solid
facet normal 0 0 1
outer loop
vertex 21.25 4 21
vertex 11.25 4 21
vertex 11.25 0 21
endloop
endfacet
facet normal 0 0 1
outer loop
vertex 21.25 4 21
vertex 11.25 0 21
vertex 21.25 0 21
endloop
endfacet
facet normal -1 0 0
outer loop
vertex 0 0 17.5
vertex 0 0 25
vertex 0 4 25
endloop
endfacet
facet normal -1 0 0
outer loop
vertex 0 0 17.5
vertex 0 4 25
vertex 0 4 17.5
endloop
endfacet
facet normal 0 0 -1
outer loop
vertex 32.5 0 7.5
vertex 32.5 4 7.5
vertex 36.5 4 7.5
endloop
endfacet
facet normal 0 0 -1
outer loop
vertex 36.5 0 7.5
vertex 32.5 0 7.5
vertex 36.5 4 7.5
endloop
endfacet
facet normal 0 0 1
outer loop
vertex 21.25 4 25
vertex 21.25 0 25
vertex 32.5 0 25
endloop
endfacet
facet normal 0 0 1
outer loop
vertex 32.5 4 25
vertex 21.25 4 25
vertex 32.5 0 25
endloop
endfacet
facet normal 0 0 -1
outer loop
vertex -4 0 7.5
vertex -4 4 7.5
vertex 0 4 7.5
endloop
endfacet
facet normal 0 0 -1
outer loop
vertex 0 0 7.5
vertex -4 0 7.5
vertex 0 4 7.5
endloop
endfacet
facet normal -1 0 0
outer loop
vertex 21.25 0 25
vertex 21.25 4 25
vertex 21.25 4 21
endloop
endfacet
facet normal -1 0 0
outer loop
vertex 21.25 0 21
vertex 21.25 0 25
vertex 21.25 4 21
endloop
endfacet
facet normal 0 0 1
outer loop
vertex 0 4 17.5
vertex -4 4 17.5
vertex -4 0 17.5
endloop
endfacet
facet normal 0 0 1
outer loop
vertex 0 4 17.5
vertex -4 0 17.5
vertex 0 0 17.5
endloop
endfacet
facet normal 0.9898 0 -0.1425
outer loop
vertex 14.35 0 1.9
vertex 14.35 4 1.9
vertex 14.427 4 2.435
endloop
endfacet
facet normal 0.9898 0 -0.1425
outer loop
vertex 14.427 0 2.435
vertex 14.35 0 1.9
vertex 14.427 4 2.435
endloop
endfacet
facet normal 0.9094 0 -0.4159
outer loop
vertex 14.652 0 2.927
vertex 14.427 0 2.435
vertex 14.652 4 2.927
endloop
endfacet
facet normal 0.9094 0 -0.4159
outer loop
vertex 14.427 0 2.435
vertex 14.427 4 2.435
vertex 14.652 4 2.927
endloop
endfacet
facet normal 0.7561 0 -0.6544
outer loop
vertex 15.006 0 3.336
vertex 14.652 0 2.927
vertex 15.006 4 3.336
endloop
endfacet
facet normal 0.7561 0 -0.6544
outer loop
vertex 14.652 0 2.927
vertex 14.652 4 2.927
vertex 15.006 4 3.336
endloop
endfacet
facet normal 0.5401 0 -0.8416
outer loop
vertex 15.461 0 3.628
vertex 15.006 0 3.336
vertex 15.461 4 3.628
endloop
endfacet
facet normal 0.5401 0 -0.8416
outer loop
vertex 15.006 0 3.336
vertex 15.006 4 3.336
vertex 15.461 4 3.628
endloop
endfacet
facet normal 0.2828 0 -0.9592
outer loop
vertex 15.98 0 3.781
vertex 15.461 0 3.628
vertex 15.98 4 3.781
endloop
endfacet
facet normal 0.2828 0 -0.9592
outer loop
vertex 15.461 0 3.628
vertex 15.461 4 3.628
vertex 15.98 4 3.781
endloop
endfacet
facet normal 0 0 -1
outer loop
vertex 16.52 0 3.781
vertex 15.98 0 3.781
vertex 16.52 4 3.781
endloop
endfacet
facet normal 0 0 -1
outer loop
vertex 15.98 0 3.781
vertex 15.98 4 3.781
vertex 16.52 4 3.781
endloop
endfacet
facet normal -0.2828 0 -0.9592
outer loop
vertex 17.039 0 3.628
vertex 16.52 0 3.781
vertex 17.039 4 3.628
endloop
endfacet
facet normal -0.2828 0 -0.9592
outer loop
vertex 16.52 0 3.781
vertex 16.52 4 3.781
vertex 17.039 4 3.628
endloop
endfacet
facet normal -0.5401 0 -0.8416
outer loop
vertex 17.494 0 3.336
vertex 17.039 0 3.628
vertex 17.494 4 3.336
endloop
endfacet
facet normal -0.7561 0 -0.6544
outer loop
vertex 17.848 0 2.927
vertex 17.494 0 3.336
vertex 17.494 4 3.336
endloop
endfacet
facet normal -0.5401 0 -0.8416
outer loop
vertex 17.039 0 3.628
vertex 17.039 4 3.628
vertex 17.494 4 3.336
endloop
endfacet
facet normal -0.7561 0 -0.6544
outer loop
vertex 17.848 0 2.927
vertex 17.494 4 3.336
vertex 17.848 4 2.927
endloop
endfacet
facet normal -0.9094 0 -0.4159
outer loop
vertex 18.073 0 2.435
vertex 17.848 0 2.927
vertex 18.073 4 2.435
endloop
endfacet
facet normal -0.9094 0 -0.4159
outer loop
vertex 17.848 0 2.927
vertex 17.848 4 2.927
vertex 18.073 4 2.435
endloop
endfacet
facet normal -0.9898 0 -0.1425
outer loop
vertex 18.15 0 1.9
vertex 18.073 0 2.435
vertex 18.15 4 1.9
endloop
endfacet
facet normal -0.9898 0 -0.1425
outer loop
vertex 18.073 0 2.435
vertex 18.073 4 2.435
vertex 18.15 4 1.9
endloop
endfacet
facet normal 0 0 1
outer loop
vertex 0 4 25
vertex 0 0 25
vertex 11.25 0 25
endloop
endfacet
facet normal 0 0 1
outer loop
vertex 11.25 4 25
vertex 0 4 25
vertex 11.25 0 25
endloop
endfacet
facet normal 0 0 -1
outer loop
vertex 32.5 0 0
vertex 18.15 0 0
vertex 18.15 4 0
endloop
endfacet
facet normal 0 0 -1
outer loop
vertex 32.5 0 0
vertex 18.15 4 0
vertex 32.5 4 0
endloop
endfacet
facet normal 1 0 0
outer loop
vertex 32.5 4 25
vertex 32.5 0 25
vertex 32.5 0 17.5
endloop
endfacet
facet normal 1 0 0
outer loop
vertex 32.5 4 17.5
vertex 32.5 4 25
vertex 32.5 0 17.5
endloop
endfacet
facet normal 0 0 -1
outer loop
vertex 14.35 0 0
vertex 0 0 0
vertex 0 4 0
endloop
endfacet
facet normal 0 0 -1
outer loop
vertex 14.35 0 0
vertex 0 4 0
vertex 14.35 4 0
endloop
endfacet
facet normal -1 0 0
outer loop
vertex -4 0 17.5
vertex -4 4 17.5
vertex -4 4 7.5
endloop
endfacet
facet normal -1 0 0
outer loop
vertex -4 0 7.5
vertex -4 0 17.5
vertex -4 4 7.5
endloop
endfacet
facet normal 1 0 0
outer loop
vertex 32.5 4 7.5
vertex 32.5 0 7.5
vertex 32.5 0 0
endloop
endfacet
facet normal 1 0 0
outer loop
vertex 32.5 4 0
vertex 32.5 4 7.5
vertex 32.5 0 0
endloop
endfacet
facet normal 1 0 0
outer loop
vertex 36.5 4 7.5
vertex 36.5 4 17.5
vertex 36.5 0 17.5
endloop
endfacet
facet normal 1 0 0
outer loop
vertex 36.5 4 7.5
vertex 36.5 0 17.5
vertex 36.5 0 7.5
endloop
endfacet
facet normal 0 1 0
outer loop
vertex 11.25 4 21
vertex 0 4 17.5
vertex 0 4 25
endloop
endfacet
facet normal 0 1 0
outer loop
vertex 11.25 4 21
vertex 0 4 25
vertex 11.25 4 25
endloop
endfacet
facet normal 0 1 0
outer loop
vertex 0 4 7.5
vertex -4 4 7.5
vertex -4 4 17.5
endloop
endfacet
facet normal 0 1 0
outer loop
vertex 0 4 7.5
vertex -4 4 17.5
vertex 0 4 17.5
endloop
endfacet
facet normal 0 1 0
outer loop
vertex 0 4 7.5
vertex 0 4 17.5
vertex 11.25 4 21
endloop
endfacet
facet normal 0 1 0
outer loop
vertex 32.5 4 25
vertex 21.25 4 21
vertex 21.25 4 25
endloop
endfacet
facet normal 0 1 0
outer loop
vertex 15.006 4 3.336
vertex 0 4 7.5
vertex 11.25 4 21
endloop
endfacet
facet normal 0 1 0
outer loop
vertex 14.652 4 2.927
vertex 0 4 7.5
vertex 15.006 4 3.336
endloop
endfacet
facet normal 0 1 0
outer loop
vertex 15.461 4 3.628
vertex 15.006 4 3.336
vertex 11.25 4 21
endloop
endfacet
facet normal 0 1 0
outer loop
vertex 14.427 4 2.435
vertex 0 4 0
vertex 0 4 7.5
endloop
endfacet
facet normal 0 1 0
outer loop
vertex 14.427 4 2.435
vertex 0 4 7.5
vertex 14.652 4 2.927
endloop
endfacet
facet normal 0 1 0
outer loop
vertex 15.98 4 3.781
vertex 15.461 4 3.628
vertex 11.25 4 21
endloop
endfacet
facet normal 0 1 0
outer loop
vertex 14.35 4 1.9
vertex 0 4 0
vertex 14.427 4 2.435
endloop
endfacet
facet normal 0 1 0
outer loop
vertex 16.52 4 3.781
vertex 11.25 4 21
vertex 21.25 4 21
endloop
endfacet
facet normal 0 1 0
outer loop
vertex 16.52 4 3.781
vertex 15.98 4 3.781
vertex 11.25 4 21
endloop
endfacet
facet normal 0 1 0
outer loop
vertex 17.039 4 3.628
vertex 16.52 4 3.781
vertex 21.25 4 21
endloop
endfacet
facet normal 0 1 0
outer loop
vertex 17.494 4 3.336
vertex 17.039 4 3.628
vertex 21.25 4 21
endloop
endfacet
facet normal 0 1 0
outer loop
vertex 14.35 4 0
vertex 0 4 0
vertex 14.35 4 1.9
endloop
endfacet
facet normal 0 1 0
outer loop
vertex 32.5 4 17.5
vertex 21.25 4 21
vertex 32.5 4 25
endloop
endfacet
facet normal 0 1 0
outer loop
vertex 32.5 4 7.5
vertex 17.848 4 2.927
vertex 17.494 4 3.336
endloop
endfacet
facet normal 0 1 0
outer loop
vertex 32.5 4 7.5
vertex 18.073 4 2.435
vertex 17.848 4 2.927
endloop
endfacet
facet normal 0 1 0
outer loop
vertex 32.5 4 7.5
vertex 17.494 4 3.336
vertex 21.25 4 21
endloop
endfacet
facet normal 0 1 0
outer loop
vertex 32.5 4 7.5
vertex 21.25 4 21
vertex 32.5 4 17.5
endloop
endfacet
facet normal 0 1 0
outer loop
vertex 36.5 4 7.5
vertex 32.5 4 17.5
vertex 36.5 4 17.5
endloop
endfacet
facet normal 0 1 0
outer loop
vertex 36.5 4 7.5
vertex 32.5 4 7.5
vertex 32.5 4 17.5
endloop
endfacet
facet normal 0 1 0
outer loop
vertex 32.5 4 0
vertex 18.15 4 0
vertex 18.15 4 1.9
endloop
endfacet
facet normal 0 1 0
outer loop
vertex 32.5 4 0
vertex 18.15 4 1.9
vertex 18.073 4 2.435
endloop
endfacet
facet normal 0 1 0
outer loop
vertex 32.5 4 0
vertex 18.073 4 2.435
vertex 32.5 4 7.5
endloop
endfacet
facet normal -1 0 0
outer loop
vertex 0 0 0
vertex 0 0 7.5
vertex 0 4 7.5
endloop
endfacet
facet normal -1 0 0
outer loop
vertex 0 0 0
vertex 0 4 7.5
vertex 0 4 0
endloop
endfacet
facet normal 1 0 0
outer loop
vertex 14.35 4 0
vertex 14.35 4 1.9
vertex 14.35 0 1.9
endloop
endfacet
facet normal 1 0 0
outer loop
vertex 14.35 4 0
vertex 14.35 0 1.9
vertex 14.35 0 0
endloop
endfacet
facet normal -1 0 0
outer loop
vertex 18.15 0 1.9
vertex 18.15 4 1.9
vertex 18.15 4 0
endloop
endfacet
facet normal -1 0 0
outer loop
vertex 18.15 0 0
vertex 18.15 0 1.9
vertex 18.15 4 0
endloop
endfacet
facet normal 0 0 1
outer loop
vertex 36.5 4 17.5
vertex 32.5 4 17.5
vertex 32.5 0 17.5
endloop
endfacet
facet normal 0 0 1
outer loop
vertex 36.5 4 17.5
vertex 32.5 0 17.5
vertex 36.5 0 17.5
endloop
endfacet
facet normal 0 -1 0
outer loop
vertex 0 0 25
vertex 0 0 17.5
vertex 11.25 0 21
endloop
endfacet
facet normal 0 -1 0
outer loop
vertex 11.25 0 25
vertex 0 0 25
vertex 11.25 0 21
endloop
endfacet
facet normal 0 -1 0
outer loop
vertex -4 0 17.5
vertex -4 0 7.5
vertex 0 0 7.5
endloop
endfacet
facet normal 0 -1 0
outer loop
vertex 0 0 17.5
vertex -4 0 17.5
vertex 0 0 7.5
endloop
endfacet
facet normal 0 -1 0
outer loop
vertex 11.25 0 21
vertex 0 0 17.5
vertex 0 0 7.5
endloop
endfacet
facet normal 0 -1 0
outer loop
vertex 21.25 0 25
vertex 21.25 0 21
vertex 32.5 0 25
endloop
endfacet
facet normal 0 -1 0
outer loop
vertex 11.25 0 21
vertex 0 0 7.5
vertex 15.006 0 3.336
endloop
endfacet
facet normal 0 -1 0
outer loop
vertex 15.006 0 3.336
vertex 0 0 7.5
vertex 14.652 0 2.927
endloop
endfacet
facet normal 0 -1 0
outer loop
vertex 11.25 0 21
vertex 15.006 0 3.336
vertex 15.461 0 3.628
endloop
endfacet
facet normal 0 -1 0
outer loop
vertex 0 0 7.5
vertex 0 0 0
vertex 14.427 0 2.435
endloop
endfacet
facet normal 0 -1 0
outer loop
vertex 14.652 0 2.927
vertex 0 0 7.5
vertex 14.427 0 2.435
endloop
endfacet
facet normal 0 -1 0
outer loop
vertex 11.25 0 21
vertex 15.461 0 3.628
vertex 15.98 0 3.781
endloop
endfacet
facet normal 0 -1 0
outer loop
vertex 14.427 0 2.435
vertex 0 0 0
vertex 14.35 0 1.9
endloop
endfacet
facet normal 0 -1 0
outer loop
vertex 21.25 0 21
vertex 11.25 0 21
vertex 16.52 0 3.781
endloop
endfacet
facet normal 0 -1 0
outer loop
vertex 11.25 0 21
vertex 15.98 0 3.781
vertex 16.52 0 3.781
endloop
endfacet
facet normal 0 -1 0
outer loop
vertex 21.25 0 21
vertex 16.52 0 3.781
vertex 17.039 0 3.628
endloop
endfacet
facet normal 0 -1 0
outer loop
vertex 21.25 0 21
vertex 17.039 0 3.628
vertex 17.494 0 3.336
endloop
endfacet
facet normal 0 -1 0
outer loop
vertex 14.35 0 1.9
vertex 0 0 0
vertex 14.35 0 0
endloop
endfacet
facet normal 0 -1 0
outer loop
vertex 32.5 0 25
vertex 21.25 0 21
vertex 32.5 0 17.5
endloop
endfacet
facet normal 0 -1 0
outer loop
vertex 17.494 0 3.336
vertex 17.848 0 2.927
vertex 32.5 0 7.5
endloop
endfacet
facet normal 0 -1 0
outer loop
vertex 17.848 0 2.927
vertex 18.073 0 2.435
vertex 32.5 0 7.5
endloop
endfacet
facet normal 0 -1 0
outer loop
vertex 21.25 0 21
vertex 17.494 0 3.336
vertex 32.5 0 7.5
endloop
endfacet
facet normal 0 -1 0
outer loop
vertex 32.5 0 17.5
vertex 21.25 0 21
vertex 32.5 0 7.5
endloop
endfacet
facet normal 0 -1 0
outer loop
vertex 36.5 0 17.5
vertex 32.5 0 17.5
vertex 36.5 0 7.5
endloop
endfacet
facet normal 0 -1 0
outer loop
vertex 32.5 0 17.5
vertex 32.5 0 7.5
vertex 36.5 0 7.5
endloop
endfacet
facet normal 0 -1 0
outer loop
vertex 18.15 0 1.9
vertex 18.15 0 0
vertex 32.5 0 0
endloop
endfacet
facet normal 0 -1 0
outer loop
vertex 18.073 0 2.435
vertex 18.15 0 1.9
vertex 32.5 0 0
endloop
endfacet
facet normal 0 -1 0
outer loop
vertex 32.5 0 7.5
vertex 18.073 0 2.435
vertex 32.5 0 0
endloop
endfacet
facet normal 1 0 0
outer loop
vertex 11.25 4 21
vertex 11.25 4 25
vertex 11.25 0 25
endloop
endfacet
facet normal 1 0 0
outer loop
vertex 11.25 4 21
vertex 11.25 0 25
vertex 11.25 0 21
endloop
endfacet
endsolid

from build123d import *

# Parameters (mm, degrees)
SKETCH1_W           = 32.5
SKETCH1_H           = 25
BOSS_EXTRUDE1_DEPTH = 4
SKETCH2_R           = 1.9
SKETCH2_W           = 3.8
SKETCH2_H           = 1.9
CUT_EXTRUDE5_DEPTH  = 5
SKETCH3_W           = 4
SKETCH3_H           = 10
BOSS_EXTRUDE2_DEPTH = 4
SKETCH4_W           = 10
SKETCH4_H           = 4
CUT_EXTRUDE6_DEPTH  = 5


with BuildPart() as part:
    # Sketch1 → Boss-Extrude1 (new body)
    with BuildSketch(Plane(origin=(0, 0, 0), x_dir=(1, 0, 0), z_dir=(0, 1, 0))):
        with Locations((16.25, -12.5)):
            Rectangle(SKETCH1_W, SKETCH1_H)
    extrude(amount=BOSS_EXTRUDE1_DEPTH)

    # Sketch2 → Cut-Extrude5 (cut, through all)
    with BuildSketch(Plane(origin=(0, 4, 0), x_dir=(1, 0, 0), z_dir=(0, 1, 0))):
        with Locations((16.25, -1.9)):
            Circle(SKETCH2_R)
        with Locations((16.25, -0.95)):
            Rectangle(SKETCH2_W, SKETCH2_H)
    extrude(amount=-CUT_EXTRUDE5_DEPTH, mode=Mode.SUBTRACT)

    # Sketch3 → Boss-Extrude2 (add, through all)
    with BuildSketch(Plane(origin=(0, 4, 0), x_dir=(1, 0, 0), z_dir=(0, 1, 0))):
        with Locations((-2, -12.5)):
            Rectangle(SKETCH3_W, SKETCH3_H)
        with Locations((34.5, -12.5)):
            Rectangle(SKETCH3_W, SKETCH3_H)
    extrude(amount=-BOSS_EXTRUDE2_DEPTH)

    # Sketch4 → Cut-Extrude6 (cut, through all)
    with BuildSketch(Plane(origin=(0, 4, 0), x_dir=(1, 0, 0), z_dir=(0, 1, 0))):
        with Locations((16.25, -23)):
            Rectangle(SKETCH4_W, SKETCH4_H)
    extrude(amount=-CUT_EXTRUDE6_DEPTH, mode=Mode.SUBTRACT)


solid = part.part
